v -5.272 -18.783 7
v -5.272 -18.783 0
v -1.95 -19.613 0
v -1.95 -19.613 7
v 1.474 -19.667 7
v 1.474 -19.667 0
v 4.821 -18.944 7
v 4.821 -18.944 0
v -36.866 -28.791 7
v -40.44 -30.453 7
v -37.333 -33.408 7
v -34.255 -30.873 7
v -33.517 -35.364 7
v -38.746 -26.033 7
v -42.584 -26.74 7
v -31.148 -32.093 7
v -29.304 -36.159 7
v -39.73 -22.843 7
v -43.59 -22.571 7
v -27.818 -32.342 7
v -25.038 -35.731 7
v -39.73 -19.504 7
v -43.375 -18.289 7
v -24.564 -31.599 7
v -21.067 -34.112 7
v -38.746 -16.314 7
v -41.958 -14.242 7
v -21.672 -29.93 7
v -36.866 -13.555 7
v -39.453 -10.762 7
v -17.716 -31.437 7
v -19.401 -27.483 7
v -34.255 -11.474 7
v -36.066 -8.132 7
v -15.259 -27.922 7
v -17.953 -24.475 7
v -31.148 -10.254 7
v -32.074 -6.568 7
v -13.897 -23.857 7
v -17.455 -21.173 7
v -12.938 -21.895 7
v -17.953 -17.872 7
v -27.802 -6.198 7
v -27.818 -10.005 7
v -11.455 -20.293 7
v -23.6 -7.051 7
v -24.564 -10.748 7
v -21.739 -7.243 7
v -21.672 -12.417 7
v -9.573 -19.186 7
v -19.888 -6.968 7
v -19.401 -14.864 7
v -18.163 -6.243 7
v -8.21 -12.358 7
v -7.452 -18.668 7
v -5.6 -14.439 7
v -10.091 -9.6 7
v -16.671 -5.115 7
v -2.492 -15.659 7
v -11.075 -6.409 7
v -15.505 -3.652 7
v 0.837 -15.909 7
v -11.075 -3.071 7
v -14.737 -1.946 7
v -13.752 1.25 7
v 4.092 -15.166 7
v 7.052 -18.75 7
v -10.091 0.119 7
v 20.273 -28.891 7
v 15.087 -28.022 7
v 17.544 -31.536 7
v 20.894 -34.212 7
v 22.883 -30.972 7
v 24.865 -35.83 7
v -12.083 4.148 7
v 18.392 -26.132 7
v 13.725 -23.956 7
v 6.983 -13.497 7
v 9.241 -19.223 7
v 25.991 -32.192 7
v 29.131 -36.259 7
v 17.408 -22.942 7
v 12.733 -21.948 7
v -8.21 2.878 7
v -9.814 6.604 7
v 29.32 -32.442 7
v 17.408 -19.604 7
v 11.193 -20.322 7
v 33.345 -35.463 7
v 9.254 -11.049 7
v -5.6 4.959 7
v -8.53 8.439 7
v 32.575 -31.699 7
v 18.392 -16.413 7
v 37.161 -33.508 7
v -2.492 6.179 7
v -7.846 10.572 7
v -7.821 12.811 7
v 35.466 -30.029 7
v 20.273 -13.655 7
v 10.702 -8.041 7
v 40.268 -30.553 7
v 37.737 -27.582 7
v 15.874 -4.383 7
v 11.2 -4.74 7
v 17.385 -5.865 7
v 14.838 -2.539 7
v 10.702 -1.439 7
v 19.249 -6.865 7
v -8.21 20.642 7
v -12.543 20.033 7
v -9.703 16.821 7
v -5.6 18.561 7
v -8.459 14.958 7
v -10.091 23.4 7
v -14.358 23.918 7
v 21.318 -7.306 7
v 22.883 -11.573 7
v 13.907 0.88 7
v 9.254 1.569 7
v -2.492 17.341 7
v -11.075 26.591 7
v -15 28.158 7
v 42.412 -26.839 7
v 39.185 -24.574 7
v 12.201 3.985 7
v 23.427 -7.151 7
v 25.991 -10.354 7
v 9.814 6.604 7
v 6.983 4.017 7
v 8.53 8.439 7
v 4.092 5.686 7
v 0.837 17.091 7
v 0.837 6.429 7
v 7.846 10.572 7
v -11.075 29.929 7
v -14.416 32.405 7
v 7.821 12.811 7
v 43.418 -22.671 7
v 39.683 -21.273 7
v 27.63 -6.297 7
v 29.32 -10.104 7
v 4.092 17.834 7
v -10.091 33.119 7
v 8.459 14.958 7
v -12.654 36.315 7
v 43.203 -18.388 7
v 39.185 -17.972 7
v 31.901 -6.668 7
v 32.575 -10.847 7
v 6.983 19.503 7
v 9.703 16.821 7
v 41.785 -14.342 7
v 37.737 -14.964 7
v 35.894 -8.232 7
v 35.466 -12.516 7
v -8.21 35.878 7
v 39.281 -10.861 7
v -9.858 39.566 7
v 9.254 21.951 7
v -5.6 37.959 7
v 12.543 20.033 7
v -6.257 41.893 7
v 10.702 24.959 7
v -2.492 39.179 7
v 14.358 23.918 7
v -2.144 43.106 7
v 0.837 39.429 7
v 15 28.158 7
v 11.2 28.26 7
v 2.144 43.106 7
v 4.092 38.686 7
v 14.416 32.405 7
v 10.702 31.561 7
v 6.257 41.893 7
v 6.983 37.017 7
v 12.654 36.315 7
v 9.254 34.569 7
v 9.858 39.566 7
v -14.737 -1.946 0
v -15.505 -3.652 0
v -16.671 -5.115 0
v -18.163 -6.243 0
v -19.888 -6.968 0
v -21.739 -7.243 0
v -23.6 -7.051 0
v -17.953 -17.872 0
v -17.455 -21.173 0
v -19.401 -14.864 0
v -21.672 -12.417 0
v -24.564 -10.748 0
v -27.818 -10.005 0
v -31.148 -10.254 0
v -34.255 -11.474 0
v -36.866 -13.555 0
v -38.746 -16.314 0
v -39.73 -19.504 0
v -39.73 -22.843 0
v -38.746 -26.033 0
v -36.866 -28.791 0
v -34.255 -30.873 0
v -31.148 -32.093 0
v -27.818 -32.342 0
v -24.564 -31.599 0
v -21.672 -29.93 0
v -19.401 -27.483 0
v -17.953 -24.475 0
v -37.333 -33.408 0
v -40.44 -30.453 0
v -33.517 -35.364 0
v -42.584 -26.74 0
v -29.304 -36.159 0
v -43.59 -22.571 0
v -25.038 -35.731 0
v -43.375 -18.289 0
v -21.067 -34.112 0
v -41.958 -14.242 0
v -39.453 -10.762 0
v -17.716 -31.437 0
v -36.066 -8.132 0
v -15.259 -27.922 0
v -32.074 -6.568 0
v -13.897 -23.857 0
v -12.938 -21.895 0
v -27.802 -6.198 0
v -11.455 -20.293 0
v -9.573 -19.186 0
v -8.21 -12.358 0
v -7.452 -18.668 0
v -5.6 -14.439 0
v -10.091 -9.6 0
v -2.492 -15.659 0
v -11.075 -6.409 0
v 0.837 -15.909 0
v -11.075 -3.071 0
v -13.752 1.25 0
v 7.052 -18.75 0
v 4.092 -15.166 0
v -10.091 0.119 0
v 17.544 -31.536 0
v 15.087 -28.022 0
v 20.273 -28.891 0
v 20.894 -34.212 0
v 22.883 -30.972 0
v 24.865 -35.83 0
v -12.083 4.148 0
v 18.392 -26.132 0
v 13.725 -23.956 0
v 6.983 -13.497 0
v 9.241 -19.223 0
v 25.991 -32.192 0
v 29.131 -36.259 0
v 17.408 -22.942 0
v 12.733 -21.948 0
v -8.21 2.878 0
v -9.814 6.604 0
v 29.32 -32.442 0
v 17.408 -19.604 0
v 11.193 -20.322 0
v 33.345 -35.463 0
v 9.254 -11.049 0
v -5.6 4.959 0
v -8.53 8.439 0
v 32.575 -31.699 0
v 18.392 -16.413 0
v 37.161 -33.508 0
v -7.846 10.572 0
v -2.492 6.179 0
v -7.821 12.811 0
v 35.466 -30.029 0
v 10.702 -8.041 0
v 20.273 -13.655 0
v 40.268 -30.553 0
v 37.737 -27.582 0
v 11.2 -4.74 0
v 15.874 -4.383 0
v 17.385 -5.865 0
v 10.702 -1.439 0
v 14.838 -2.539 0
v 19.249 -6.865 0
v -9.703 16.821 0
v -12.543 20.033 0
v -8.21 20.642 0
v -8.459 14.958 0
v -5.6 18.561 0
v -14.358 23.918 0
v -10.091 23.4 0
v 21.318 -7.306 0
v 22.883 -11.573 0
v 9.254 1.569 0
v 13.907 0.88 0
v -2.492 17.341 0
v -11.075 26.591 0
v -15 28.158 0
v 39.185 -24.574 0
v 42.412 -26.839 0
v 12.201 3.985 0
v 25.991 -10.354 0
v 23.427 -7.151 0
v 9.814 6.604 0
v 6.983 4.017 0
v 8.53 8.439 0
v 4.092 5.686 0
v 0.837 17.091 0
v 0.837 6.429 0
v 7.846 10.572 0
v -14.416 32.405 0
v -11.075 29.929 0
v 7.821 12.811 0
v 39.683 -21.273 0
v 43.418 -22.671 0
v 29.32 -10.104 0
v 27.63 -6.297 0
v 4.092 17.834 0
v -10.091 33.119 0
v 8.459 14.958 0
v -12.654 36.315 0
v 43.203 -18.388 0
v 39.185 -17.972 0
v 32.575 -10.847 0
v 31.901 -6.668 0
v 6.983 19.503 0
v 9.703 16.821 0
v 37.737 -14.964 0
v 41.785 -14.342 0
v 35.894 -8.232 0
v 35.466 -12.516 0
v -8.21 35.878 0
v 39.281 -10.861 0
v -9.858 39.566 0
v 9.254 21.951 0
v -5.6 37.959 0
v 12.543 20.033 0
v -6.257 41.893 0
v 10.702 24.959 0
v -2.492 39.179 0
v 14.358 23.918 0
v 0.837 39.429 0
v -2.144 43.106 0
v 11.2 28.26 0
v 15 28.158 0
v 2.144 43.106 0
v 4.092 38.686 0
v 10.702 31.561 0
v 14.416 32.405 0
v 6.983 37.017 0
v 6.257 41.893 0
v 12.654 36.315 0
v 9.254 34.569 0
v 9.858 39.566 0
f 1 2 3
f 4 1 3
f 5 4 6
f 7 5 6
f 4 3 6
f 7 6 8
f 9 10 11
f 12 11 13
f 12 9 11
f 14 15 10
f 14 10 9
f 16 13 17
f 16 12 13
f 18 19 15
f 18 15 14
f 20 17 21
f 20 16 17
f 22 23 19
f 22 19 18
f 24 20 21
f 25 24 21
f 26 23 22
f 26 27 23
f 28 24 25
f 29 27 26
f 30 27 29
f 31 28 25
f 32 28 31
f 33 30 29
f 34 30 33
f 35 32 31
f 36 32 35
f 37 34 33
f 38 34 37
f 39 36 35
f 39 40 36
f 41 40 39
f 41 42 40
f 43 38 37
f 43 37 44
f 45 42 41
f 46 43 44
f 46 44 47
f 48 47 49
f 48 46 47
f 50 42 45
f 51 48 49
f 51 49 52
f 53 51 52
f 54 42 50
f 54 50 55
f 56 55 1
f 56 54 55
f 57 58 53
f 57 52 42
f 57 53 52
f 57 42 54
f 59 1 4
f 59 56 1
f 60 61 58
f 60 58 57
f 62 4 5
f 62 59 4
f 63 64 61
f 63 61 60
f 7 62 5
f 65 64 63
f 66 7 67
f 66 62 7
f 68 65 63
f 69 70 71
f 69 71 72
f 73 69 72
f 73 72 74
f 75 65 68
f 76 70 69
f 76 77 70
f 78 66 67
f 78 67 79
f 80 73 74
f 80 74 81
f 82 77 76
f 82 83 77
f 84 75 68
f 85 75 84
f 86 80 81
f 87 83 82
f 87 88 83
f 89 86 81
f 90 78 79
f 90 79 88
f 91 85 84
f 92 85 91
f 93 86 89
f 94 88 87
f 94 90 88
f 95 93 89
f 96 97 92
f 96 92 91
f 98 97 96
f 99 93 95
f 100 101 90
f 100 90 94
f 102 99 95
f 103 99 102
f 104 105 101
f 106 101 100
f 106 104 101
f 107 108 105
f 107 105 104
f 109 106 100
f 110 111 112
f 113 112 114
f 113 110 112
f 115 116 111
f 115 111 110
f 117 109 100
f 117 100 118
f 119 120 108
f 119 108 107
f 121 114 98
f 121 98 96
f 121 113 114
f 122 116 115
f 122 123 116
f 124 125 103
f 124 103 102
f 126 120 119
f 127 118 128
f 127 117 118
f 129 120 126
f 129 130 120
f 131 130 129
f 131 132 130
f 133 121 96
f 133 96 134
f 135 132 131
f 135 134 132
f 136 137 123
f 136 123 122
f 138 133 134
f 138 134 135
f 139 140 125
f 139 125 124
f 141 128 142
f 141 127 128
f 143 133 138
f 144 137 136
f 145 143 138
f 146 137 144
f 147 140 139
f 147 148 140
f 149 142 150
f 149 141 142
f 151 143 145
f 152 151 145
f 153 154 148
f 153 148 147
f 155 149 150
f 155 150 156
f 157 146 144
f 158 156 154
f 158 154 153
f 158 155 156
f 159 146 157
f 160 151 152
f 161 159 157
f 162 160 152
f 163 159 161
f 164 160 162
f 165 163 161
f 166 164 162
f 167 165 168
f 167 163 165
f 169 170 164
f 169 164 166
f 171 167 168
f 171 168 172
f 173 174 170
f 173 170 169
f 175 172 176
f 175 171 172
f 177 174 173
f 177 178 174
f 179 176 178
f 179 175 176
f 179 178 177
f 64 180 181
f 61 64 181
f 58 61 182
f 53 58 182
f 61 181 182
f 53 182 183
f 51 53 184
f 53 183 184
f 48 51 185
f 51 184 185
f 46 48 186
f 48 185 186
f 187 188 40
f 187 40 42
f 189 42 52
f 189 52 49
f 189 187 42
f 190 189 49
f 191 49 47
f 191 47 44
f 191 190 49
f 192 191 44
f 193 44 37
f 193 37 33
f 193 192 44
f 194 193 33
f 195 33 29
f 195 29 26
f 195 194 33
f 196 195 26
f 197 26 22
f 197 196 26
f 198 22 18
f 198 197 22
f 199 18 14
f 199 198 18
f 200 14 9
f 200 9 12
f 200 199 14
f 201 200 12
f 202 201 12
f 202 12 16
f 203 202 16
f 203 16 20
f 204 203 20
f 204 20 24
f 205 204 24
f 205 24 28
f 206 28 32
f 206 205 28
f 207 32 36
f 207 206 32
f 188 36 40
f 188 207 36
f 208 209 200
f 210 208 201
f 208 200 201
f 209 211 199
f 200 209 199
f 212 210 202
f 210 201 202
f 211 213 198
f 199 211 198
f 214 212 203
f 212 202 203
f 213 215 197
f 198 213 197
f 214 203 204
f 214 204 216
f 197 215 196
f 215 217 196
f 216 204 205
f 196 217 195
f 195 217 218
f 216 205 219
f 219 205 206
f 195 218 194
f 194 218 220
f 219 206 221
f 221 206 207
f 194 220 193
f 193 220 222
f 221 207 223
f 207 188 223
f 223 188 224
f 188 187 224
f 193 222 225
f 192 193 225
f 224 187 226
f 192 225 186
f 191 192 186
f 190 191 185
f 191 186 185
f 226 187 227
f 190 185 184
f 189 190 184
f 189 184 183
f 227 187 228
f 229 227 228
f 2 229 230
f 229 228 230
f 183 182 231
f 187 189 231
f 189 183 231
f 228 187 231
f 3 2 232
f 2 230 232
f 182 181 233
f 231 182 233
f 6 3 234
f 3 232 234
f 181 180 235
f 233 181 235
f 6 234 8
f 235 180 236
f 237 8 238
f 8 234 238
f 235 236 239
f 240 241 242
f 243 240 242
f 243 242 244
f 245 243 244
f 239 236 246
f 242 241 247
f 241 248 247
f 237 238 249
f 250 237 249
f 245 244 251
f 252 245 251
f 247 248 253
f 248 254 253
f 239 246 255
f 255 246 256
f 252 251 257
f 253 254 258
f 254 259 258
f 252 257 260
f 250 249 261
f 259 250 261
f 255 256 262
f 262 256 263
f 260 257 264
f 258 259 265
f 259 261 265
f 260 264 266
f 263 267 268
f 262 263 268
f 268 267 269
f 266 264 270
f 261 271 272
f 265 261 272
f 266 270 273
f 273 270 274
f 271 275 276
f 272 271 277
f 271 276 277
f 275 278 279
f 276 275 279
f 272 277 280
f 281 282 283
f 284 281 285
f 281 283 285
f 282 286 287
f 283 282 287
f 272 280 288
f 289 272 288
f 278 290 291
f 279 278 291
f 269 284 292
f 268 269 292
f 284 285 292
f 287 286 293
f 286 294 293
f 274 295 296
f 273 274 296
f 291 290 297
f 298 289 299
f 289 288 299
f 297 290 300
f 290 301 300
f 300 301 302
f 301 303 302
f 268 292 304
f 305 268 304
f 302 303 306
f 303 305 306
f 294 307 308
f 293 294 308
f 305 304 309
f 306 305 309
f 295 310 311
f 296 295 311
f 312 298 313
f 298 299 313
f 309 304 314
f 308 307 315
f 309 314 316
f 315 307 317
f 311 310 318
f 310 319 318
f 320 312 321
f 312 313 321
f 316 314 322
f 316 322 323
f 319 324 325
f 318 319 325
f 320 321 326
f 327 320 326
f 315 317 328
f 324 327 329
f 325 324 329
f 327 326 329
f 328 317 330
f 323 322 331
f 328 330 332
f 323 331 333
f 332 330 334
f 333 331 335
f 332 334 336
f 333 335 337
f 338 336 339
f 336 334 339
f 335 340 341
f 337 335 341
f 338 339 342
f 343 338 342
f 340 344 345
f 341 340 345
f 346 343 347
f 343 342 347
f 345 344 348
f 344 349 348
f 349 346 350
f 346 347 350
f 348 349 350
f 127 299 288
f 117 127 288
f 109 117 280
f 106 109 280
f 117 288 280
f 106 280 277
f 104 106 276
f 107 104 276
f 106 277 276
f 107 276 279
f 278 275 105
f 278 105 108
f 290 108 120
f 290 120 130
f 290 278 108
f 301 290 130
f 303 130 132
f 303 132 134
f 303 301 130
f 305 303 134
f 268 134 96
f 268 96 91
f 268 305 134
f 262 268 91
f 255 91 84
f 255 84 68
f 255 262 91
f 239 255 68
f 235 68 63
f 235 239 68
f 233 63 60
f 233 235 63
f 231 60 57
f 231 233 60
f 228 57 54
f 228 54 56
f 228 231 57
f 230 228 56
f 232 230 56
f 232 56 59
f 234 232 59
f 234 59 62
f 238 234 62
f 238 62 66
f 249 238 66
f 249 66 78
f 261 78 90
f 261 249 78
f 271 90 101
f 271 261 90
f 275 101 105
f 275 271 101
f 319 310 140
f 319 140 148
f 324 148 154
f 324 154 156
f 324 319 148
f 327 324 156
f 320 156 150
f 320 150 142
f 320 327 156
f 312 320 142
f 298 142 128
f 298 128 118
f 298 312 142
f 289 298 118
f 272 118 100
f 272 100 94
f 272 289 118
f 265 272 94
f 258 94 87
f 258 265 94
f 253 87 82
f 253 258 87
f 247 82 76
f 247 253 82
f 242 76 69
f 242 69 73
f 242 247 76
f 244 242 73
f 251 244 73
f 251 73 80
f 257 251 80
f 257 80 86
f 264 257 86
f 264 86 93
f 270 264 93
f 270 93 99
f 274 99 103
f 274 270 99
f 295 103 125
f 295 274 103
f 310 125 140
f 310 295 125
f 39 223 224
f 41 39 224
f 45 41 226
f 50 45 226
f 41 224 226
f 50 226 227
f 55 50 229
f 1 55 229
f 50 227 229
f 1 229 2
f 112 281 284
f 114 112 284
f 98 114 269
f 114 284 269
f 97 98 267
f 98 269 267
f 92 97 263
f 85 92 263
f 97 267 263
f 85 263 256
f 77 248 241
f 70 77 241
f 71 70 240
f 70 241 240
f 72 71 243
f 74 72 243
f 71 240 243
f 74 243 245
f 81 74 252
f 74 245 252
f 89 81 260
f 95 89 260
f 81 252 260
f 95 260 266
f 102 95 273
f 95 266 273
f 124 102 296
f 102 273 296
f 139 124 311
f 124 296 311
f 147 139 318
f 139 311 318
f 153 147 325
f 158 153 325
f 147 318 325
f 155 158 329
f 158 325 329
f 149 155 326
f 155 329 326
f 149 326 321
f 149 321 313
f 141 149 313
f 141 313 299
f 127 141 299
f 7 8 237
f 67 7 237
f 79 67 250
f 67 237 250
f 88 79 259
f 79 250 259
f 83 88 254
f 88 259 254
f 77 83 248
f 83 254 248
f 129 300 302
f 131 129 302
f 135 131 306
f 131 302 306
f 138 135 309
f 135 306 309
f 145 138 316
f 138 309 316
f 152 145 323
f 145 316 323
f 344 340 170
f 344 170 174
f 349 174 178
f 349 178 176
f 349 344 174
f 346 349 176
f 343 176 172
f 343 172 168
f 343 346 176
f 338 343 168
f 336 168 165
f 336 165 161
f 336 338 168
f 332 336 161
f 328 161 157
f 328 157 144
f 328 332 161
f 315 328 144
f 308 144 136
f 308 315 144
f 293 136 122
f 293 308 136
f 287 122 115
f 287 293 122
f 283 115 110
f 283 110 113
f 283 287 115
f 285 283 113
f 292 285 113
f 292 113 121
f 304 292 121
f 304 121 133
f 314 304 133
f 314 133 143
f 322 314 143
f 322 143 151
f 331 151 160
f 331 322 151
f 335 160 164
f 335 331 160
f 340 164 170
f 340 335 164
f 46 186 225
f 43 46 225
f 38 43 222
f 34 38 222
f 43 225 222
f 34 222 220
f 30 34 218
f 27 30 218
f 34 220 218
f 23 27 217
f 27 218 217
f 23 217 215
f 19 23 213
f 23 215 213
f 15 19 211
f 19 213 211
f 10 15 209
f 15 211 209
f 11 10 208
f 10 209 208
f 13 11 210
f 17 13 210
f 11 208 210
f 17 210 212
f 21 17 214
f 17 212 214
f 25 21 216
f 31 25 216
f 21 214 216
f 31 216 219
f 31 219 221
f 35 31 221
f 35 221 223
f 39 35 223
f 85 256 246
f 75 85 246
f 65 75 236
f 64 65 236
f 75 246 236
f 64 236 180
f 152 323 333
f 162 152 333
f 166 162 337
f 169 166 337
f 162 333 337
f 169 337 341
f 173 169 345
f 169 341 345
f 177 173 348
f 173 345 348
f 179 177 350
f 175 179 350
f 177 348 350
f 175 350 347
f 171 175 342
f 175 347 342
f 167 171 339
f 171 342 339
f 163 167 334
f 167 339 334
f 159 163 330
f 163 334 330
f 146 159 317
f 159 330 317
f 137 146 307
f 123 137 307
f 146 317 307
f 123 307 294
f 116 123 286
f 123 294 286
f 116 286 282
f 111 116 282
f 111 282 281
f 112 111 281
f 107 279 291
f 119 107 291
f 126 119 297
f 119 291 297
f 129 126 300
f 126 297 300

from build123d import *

# Parameters (mm, degrees)
F0_R     = 11.2
F1_DEPTH = 7
F2_DEPTH = 7


with BuildPart() as f1:
    # F0 (on Top) → F1 (new body)
    with BuildSketch(Plane.XY):
        with BuildLine():
            ThreePointArc((9.814137, 6.603833), (7.749518, 11.690361), (9.702716, 16.820705))
            ThreePointArc((9.702716, 16.820705), (0, 43.259993), (-9.702716, 16.820705))
            ThreePointArc((-9.702716, 16.820705), (-7.749518, 11.690361), (-9.814137, 6.603833))
            ThreePointArc((-9.814137, 6.603833), (-12.998756, 2.745467), (-14.737406, -1.945575))
            ThreePointArc((-14.737406, -1.945575), (-13.075563, -12.090494), (-5.272209, -18.782935))
            ThreePointArc((-5.272209, -18.782935), (-0.239573, -19.738094), (4.821001, -18.94416))
            ThreePointArc((4.821001, -18.94416), (12.802187, -12.556912), (14.837681, -2.539276))
            ThreePointArc((14.837681, -2.539276), (13.146374, 2.483071), (9.814137, 6.603833))
        make_face()
        with Locations((0, -4.740007)):
            Circle(F0_R, mode=Mode.SUBTRACT)
        with Locations((0, 28.259993)):
            Circle(F0_R, mode=Mode.SUBTRACT)
    extrude(amount=F1_DEPTH)

    # F0 (on Top) → F2 (join)
    with BuildSketch(Plane.XY):
        with BuildLine():
            ThreePointArc((9.814137, 6.603833), (7.749518, 11.690361), (9.702716, 16.820705))
            ThreePointArc((9.702716, 16.820705), (0, 43.259993), (-9.702716, 16.820705))
            ThreePointArc((-9.702716, 16.820705), (-7.749518, 11.690361), (-9.814137, 6.603833))
            ThreePointArc((-9.814137, 6.603833), (-12.998756, 2.745467), (-14.737406, -1.945575))
            ThreePointArc((-14.737406, -1.945575), (-13.075563, -12.090494), (-5.272209, -18.782935))
            ThreePointArc((-5.272209, -18.782935), (-0.239573, -19.738094), (4.821001, -18.94416))
            ThreePointArc((4.821001, -18.94416), (12.802187, -12.556912), (14.837681, -2.539276))
            ThreePointArc((14.837681, -2.539276), (13.146374, 2.483071), (9.814137, 6.603833))
        make_face()
        with Locations((0, -4.740007)):
            Circle(F0_R, mode=Mode.SUBTRACT)
        with Locations((0, 28.259993)):
            Circle(F0_R, mode=Mode.SUBTRACT)
        with BuildLine():
            ThreePointArc((23.427499, -7.150505), (18.281136, -6.430983), (14.837681, -2.539276))
            ThreePointArc((14.837681, -2.539276), (12.802187, -12.556912), (4.821001, -18.94416))
            ThreePointArc((4.821001, -18.94416), (10.258373, -19.699411), (13.724783, -23.956102))
            ThreePointArc((13.724783, -23.956102), (41.473236, -28.772947), (23.427499, -7.150505))
        make_face()
        with Locations((28.482855, -21.272947)):
            Circle(F0_R, mode=Mode.SUBTRACT)
        with BuildLine():
            ThreePointArc((-5.272209, -18.782935), (-13.075563, -12.090494), (-14.737406, -1.945575))
            ThreePointArc((-14.737406, -1.945575), (-18.16346, -6.243294), (-23.600001, -7.050911))
            ThreePointArc((-23.600001, -7.050911), (-41.645738, -28.673353), (-13.897285, -23.856507))
            ThreePointArc((-13.897285, -23.856507), (-10.554578, -19.671007), (-5.272209, -18.782935))
        make_face()
        with Locations((-28.655357, -21.173353)):
            Circle(F0_R, mode=Mode.SUBTRACT)
    extrude(amount=F2_DEPTH)


solid = f1.part
